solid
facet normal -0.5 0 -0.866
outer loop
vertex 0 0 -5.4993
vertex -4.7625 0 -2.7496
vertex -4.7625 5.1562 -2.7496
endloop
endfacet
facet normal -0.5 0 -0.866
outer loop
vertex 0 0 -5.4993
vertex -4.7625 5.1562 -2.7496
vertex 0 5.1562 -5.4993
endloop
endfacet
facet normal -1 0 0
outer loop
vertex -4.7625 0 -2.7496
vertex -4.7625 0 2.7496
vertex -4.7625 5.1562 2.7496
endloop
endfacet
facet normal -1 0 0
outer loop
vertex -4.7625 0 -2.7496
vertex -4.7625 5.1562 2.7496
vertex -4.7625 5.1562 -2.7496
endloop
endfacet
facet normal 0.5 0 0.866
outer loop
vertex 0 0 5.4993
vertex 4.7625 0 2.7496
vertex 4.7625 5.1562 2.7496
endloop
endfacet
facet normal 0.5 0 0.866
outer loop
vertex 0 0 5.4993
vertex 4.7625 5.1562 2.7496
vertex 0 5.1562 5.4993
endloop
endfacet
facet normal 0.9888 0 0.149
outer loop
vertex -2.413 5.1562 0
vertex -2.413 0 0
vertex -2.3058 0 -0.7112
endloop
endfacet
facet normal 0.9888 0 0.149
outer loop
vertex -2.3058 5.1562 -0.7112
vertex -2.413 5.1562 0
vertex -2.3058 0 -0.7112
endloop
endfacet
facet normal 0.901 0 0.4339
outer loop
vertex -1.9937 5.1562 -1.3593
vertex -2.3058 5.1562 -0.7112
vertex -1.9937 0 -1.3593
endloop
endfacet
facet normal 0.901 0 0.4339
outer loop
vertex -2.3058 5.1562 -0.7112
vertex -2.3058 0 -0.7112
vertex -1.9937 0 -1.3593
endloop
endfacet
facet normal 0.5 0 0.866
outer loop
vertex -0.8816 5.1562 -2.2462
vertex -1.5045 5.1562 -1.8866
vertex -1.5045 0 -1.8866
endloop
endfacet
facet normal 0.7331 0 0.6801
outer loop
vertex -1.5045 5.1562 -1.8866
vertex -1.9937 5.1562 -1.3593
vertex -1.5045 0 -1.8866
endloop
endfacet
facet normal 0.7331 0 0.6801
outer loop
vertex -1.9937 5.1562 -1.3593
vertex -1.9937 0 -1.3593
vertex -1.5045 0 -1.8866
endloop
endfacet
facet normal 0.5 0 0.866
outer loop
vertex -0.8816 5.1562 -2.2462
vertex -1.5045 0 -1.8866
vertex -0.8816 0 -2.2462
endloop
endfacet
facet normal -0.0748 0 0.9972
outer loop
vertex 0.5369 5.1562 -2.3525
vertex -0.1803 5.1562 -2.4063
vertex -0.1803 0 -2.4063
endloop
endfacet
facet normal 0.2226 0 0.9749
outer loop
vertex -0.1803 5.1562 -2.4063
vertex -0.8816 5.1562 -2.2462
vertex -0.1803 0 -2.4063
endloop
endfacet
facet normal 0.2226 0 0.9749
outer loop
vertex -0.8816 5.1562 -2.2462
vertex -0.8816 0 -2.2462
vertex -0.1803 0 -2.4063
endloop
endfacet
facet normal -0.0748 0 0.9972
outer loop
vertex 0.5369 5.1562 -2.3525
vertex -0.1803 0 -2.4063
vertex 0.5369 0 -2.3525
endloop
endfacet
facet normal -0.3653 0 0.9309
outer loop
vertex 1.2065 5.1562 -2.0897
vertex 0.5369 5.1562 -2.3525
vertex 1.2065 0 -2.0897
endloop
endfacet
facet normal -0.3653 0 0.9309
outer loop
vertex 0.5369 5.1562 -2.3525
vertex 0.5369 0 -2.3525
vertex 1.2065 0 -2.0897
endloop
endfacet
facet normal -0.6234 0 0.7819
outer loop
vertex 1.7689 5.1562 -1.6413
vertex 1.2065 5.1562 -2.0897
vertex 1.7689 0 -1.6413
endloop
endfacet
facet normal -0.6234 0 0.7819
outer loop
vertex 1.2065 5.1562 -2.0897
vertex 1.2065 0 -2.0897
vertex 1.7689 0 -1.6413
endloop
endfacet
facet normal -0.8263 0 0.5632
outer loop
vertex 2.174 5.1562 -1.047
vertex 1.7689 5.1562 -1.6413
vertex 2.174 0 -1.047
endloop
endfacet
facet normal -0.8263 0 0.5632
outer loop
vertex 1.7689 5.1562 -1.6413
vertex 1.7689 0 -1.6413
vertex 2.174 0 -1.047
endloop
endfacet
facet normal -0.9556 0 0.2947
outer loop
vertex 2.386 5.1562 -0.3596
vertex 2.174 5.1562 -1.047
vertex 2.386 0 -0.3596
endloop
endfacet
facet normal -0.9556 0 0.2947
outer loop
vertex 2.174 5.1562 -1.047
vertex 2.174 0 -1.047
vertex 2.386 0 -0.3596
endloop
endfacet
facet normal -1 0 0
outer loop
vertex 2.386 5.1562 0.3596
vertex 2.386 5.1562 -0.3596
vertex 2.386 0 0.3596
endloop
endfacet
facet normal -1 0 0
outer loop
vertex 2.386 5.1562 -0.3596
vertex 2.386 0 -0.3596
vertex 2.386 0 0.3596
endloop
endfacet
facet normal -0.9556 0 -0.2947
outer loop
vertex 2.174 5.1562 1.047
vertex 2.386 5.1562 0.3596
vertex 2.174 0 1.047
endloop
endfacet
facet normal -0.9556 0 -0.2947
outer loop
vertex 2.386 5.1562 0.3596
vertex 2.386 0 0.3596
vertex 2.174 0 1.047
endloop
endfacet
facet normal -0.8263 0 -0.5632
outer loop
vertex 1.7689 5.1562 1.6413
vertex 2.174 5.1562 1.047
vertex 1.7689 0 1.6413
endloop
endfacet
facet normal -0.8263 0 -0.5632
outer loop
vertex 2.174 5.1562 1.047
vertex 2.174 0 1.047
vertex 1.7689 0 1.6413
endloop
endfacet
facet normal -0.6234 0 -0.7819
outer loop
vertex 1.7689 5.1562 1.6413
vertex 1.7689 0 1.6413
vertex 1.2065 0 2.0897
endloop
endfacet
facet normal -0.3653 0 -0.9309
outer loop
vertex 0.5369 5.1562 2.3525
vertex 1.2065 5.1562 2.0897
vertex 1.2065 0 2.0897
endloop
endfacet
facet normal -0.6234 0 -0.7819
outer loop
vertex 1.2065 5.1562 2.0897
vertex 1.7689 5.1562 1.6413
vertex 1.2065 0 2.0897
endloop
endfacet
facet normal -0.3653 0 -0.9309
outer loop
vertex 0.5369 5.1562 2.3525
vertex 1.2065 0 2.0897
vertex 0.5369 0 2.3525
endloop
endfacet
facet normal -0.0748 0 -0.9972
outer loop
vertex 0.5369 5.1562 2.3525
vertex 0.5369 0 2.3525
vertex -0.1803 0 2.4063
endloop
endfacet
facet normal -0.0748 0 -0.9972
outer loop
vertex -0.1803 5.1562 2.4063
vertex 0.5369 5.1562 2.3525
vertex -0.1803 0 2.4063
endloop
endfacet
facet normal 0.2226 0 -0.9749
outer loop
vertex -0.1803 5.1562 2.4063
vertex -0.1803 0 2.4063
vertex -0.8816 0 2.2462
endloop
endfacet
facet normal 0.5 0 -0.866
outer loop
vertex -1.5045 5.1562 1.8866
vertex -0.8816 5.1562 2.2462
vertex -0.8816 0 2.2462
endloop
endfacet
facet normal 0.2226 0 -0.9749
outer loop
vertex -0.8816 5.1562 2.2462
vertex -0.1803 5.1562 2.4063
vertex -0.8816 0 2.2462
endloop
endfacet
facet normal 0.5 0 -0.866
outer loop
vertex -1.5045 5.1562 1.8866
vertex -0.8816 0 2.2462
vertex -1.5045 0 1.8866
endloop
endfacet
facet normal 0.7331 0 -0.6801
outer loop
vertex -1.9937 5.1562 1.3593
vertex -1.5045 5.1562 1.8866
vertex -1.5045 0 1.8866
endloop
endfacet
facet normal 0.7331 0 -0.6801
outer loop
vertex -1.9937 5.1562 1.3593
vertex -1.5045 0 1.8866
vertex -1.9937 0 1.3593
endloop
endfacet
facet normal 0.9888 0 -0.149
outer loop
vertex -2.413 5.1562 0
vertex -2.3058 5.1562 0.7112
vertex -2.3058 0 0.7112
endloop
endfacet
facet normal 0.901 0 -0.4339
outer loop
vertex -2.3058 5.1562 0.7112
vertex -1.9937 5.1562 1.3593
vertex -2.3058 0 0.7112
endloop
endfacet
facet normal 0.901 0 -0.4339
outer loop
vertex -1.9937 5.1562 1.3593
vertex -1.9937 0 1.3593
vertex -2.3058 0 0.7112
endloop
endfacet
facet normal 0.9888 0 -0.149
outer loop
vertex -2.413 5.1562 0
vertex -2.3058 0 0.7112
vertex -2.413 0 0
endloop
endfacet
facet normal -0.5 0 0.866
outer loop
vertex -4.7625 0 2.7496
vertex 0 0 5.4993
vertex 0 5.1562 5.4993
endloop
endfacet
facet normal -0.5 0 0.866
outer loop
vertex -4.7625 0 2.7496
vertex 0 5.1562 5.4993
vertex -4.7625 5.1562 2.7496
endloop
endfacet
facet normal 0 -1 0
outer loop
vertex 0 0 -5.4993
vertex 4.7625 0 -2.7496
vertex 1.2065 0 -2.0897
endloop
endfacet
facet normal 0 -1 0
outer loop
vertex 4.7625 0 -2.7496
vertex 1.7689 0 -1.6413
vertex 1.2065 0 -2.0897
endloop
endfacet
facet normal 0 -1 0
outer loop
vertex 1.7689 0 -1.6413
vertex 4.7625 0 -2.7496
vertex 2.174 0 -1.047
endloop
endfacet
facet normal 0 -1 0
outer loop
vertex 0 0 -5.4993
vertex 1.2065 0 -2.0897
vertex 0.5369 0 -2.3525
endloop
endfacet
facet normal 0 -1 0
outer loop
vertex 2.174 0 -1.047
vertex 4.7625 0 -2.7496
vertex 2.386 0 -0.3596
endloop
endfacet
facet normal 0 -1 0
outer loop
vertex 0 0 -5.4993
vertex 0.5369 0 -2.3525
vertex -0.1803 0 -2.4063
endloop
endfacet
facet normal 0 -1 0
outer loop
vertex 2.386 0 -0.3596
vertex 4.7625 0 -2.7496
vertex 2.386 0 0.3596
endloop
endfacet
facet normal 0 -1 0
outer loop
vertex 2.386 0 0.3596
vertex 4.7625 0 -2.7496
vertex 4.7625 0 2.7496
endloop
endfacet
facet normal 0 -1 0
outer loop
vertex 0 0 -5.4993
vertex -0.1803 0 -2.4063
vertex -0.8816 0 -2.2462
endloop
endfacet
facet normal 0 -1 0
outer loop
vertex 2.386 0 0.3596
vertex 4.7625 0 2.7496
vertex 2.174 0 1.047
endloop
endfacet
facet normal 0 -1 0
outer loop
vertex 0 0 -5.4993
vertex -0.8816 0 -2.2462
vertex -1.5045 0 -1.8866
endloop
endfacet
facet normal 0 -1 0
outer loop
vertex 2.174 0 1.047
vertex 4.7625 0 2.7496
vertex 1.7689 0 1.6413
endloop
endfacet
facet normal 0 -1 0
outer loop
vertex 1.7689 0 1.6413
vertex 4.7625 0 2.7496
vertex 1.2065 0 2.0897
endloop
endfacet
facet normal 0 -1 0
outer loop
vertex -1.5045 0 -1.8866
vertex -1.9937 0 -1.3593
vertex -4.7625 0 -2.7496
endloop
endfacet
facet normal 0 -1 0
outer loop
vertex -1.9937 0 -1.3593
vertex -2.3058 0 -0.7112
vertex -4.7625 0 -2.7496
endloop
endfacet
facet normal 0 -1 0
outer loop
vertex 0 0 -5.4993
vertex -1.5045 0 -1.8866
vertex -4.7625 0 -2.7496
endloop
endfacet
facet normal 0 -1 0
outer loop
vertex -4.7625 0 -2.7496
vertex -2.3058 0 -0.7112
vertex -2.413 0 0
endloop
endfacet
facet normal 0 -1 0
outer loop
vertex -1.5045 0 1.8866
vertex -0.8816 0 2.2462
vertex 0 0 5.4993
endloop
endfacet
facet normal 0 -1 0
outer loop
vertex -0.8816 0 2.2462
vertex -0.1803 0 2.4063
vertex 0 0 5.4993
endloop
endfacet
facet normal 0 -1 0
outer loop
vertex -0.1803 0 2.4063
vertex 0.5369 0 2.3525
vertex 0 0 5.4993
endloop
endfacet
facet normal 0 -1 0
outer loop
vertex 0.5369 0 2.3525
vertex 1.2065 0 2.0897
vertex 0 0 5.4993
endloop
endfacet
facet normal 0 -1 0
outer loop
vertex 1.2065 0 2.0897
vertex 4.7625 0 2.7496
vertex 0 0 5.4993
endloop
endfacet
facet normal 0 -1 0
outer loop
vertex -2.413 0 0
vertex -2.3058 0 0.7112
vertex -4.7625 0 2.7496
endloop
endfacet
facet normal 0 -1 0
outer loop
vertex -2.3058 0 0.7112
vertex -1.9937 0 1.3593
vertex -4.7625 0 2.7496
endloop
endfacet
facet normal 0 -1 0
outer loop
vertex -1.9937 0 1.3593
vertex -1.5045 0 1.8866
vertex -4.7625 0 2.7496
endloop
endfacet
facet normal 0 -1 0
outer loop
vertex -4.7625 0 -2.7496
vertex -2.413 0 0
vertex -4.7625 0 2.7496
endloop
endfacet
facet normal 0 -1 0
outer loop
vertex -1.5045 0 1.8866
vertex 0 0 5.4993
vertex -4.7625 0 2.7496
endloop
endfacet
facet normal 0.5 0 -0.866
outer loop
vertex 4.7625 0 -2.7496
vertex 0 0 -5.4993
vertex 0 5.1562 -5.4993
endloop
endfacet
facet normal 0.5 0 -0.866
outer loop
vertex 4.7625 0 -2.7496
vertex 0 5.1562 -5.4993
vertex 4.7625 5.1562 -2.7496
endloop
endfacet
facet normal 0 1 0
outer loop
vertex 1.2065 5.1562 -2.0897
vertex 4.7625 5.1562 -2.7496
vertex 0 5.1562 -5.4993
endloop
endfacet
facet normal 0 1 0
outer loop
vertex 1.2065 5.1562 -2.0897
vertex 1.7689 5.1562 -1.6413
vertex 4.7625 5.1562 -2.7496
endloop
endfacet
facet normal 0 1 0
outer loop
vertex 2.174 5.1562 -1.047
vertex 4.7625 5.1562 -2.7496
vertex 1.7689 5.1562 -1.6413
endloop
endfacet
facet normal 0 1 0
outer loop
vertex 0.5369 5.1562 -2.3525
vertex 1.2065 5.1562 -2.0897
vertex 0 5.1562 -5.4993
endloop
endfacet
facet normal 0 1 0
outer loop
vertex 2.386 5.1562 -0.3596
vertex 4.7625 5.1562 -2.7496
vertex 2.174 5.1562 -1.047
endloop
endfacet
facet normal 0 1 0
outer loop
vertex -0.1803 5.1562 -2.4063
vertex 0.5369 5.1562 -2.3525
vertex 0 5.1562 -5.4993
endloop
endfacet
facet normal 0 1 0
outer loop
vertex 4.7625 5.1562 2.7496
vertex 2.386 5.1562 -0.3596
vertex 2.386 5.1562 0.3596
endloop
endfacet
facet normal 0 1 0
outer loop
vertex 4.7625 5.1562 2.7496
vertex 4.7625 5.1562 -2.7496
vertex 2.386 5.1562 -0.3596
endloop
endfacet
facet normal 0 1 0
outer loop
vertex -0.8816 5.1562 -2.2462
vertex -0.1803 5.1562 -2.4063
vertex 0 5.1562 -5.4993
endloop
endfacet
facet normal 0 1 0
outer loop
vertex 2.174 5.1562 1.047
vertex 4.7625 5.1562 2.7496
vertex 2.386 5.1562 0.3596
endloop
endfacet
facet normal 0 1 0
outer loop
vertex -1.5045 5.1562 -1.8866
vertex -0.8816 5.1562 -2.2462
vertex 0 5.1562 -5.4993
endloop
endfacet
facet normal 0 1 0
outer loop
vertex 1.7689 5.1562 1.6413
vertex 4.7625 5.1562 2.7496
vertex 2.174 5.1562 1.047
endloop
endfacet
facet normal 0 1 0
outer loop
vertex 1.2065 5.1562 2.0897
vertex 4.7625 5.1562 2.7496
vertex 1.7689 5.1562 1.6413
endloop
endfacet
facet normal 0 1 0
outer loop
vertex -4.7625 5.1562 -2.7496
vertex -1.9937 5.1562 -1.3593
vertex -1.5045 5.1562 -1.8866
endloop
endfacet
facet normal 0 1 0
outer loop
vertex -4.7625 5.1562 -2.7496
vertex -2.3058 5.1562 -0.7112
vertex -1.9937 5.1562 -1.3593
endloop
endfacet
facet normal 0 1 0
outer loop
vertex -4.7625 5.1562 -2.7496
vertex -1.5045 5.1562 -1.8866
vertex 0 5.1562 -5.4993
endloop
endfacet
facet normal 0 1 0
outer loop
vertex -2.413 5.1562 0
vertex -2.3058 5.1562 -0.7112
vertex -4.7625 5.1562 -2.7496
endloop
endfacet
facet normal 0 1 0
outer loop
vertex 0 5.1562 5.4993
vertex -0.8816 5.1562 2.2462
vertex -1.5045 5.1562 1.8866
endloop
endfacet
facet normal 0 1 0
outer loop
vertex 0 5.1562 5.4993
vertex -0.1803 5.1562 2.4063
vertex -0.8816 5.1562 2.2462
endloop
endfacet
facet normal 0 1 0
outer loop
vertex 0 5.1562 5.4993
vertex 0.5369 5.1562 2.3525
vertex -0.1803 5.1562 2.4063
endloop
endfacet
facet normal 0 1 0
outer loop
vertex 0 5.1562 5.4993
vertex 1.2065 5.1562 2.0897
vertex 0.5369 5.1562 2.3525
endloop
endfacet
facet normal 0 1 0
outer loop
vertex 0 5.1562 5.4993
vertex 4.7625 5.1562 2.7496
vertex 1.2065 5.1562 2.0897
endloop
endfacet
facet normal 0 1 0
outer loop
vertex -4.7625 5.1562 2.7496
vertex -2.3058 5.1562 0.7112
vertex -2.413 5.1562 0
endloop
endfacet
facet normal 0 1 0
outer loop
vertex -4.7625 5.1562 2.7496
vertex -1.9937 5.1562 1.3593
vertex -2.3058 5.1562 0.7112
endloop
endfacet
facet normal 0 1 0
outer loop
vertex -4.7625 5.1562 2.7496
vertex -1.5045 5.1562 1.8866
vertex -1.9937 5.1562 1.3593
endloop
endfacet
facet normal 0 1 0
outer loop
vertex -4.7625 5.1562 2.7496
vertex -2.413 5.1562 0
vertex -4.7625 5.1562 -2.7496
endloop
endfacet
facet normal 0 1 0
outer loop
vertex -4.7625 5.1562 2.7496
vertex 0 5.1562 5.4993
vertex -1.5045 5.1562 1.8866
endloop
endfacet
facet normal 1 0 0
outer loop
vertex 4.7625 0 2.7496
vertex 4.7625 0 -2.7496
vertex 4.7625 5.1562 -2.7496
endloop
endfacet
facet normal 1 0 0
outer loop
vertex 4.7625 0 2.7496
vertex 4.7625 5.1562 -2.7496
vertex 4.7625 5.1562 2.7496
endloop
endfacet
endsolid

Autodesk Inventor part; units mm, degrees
ref_plane "YZ Plane" through (0, 0, 0) normal (1, 0, 0) x (0, 1, 0)
ref_plane "XZ Plane" through (0, 0, 0) normal (0, 1, 0) x (-1, 0, 0)
ref_plane "XY Plane" through (0, 0, 0) normal (0, 0, 1) x (1, 0, 0)
sketch "Sketch1" plane through (0, 0, 0) normal (0, 1, 0) x (-1, 0, 0)
  circle A0 centre (0, 0) radius 2.413
  line L0 (4.7625, -2.7496) -> (0, -5.4993)
  line L1 (0, -5.4993) -> (-4.7625, -2.7496)
  line L2 (-4.7625, -2.7496) -> (-4.7625, 2.7496)
  line L3 (-4.7625, 2.7496) -> (0, 5.4993)
  line L4 (0, 5.4993) -> (4.7625, 2.7496)
  line L5 (4.7625, 2.7496) -> (4.7625, -2.7496)
  dimension "d0" = 4.826
  dimension "d1" = 9.525
extrude "Extrusion1" add sketch "Sketch1" along normal blind 5.1562
properties part number "10-32 nut"
